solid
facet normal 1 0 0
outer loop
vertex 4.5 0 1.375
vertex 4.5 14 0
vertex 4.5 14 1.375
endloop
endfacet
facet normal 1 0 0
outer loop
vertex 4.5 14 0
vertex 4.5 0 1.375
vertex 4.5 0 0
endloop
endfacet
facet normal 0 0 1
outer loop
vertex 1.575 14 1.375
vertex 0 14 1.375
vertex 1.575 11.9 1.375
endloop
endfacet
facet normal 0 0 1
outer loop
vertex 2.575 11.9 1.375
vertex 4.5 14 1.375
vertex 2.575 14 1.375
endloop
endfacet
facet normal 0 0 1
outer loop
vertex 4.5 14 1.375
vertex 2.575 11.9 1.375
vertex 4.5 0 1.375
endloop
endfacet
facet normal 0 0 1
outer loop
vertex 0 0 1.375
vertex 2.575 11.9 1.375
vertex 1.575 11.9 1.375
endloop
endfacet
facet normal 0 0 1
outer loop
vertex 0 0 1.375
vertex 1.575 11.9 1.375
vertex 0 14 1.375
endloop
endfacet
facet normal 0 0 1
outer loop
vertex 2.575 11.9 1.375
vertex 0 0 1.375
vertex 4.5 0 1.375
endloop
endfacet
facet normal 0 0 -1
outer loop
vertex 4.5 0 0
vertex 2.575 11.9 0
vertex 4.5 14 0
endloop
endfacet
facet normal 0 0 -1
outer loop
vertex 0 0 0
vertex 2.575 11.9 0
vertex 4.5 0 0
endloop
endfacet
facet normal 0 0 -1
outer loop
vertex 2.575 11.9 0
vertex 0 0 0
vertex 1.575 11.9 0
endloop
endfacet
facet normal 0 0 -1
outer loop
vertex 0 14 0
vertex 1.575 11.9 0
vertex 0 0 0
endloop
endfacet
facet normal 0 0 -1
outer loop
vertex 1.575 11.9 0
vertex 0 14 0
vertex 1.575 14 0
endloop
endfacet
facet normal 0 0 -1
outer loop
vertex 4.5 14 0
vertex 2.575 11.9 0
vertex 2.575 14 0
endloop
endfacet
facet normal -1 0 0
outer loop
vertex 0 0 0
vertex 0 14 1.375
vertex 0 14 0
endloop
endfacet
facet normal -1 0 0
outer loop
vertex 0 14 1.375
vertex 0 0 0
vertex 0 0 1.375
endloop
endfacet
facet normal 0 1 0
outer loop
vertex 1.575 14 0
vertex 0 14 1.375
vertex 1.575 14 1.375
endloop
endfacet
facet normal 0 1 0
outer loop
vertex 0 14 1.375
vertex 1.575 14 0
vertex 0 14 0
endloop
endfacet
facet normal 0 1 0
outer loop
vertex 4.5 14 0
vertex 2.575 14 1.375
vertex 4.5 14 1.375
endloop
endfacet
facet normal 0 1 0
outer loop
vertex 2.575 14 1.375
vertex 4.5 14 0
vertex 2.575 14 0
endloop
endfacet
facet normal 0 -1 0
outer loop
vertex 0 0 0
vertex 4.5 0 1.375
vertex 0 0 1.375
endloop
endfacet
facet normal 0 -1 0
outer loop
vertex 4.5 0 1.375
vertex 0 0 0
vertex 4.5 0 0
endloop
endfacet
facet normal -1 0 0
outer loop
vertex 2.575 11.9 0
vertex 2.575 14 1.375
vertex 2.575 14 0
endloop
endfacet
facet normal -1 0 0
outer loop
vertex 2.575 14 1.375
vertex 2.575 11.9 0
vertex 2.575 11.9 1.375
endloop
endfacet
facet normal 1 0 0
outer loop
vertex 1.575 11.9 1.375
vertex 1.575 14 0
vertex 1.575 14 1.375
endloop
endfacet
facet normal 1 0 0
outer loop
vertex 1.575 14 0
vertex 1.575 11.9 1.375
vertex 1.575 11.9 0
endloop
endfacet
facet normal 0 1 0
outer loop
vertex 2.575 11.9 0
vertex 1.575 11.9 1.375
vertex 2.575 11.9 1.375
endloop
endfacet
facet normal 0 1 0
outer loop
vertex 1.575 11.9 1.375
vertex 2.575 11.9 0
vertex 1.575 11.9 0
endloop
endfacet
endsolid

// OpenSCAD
// Electric violin parametric placeholder geometry.
// NOT fabrication authority. Scaffold for future CAD authoring.
// Dimensions from electric-violin-design-table.xlsx (4-string baseline).
// Authority: pending_measurement — do not use for fabrication without
// review against family-spec.csv and a measured template.

scale_length_in       = 12.9;
body_length_in        = 14.0;
body_width_in         = 4.5;   // solid-body; narrower than acoustic
body_thickness_in     = 1.375;
neck_width_nut_in     = 1.0;
bridge_height_in      = 1.25;
pickup_cavity_len_in  = 4.0;   // piezo bridge or under-bridge cavity
string_count          = 4;

module body() {
  cube([body_width_in, body_length_in, body_thickness_in]);
}

module neck_tenon() {
  translate([body_width_in * 0.35, body_length_in * 0.85, 0])
    cube([neck_width_nut_in, body_length_in * 0.18, body_thickness_in]);
}

difference() {
  body();
  neck_tenon();
}
